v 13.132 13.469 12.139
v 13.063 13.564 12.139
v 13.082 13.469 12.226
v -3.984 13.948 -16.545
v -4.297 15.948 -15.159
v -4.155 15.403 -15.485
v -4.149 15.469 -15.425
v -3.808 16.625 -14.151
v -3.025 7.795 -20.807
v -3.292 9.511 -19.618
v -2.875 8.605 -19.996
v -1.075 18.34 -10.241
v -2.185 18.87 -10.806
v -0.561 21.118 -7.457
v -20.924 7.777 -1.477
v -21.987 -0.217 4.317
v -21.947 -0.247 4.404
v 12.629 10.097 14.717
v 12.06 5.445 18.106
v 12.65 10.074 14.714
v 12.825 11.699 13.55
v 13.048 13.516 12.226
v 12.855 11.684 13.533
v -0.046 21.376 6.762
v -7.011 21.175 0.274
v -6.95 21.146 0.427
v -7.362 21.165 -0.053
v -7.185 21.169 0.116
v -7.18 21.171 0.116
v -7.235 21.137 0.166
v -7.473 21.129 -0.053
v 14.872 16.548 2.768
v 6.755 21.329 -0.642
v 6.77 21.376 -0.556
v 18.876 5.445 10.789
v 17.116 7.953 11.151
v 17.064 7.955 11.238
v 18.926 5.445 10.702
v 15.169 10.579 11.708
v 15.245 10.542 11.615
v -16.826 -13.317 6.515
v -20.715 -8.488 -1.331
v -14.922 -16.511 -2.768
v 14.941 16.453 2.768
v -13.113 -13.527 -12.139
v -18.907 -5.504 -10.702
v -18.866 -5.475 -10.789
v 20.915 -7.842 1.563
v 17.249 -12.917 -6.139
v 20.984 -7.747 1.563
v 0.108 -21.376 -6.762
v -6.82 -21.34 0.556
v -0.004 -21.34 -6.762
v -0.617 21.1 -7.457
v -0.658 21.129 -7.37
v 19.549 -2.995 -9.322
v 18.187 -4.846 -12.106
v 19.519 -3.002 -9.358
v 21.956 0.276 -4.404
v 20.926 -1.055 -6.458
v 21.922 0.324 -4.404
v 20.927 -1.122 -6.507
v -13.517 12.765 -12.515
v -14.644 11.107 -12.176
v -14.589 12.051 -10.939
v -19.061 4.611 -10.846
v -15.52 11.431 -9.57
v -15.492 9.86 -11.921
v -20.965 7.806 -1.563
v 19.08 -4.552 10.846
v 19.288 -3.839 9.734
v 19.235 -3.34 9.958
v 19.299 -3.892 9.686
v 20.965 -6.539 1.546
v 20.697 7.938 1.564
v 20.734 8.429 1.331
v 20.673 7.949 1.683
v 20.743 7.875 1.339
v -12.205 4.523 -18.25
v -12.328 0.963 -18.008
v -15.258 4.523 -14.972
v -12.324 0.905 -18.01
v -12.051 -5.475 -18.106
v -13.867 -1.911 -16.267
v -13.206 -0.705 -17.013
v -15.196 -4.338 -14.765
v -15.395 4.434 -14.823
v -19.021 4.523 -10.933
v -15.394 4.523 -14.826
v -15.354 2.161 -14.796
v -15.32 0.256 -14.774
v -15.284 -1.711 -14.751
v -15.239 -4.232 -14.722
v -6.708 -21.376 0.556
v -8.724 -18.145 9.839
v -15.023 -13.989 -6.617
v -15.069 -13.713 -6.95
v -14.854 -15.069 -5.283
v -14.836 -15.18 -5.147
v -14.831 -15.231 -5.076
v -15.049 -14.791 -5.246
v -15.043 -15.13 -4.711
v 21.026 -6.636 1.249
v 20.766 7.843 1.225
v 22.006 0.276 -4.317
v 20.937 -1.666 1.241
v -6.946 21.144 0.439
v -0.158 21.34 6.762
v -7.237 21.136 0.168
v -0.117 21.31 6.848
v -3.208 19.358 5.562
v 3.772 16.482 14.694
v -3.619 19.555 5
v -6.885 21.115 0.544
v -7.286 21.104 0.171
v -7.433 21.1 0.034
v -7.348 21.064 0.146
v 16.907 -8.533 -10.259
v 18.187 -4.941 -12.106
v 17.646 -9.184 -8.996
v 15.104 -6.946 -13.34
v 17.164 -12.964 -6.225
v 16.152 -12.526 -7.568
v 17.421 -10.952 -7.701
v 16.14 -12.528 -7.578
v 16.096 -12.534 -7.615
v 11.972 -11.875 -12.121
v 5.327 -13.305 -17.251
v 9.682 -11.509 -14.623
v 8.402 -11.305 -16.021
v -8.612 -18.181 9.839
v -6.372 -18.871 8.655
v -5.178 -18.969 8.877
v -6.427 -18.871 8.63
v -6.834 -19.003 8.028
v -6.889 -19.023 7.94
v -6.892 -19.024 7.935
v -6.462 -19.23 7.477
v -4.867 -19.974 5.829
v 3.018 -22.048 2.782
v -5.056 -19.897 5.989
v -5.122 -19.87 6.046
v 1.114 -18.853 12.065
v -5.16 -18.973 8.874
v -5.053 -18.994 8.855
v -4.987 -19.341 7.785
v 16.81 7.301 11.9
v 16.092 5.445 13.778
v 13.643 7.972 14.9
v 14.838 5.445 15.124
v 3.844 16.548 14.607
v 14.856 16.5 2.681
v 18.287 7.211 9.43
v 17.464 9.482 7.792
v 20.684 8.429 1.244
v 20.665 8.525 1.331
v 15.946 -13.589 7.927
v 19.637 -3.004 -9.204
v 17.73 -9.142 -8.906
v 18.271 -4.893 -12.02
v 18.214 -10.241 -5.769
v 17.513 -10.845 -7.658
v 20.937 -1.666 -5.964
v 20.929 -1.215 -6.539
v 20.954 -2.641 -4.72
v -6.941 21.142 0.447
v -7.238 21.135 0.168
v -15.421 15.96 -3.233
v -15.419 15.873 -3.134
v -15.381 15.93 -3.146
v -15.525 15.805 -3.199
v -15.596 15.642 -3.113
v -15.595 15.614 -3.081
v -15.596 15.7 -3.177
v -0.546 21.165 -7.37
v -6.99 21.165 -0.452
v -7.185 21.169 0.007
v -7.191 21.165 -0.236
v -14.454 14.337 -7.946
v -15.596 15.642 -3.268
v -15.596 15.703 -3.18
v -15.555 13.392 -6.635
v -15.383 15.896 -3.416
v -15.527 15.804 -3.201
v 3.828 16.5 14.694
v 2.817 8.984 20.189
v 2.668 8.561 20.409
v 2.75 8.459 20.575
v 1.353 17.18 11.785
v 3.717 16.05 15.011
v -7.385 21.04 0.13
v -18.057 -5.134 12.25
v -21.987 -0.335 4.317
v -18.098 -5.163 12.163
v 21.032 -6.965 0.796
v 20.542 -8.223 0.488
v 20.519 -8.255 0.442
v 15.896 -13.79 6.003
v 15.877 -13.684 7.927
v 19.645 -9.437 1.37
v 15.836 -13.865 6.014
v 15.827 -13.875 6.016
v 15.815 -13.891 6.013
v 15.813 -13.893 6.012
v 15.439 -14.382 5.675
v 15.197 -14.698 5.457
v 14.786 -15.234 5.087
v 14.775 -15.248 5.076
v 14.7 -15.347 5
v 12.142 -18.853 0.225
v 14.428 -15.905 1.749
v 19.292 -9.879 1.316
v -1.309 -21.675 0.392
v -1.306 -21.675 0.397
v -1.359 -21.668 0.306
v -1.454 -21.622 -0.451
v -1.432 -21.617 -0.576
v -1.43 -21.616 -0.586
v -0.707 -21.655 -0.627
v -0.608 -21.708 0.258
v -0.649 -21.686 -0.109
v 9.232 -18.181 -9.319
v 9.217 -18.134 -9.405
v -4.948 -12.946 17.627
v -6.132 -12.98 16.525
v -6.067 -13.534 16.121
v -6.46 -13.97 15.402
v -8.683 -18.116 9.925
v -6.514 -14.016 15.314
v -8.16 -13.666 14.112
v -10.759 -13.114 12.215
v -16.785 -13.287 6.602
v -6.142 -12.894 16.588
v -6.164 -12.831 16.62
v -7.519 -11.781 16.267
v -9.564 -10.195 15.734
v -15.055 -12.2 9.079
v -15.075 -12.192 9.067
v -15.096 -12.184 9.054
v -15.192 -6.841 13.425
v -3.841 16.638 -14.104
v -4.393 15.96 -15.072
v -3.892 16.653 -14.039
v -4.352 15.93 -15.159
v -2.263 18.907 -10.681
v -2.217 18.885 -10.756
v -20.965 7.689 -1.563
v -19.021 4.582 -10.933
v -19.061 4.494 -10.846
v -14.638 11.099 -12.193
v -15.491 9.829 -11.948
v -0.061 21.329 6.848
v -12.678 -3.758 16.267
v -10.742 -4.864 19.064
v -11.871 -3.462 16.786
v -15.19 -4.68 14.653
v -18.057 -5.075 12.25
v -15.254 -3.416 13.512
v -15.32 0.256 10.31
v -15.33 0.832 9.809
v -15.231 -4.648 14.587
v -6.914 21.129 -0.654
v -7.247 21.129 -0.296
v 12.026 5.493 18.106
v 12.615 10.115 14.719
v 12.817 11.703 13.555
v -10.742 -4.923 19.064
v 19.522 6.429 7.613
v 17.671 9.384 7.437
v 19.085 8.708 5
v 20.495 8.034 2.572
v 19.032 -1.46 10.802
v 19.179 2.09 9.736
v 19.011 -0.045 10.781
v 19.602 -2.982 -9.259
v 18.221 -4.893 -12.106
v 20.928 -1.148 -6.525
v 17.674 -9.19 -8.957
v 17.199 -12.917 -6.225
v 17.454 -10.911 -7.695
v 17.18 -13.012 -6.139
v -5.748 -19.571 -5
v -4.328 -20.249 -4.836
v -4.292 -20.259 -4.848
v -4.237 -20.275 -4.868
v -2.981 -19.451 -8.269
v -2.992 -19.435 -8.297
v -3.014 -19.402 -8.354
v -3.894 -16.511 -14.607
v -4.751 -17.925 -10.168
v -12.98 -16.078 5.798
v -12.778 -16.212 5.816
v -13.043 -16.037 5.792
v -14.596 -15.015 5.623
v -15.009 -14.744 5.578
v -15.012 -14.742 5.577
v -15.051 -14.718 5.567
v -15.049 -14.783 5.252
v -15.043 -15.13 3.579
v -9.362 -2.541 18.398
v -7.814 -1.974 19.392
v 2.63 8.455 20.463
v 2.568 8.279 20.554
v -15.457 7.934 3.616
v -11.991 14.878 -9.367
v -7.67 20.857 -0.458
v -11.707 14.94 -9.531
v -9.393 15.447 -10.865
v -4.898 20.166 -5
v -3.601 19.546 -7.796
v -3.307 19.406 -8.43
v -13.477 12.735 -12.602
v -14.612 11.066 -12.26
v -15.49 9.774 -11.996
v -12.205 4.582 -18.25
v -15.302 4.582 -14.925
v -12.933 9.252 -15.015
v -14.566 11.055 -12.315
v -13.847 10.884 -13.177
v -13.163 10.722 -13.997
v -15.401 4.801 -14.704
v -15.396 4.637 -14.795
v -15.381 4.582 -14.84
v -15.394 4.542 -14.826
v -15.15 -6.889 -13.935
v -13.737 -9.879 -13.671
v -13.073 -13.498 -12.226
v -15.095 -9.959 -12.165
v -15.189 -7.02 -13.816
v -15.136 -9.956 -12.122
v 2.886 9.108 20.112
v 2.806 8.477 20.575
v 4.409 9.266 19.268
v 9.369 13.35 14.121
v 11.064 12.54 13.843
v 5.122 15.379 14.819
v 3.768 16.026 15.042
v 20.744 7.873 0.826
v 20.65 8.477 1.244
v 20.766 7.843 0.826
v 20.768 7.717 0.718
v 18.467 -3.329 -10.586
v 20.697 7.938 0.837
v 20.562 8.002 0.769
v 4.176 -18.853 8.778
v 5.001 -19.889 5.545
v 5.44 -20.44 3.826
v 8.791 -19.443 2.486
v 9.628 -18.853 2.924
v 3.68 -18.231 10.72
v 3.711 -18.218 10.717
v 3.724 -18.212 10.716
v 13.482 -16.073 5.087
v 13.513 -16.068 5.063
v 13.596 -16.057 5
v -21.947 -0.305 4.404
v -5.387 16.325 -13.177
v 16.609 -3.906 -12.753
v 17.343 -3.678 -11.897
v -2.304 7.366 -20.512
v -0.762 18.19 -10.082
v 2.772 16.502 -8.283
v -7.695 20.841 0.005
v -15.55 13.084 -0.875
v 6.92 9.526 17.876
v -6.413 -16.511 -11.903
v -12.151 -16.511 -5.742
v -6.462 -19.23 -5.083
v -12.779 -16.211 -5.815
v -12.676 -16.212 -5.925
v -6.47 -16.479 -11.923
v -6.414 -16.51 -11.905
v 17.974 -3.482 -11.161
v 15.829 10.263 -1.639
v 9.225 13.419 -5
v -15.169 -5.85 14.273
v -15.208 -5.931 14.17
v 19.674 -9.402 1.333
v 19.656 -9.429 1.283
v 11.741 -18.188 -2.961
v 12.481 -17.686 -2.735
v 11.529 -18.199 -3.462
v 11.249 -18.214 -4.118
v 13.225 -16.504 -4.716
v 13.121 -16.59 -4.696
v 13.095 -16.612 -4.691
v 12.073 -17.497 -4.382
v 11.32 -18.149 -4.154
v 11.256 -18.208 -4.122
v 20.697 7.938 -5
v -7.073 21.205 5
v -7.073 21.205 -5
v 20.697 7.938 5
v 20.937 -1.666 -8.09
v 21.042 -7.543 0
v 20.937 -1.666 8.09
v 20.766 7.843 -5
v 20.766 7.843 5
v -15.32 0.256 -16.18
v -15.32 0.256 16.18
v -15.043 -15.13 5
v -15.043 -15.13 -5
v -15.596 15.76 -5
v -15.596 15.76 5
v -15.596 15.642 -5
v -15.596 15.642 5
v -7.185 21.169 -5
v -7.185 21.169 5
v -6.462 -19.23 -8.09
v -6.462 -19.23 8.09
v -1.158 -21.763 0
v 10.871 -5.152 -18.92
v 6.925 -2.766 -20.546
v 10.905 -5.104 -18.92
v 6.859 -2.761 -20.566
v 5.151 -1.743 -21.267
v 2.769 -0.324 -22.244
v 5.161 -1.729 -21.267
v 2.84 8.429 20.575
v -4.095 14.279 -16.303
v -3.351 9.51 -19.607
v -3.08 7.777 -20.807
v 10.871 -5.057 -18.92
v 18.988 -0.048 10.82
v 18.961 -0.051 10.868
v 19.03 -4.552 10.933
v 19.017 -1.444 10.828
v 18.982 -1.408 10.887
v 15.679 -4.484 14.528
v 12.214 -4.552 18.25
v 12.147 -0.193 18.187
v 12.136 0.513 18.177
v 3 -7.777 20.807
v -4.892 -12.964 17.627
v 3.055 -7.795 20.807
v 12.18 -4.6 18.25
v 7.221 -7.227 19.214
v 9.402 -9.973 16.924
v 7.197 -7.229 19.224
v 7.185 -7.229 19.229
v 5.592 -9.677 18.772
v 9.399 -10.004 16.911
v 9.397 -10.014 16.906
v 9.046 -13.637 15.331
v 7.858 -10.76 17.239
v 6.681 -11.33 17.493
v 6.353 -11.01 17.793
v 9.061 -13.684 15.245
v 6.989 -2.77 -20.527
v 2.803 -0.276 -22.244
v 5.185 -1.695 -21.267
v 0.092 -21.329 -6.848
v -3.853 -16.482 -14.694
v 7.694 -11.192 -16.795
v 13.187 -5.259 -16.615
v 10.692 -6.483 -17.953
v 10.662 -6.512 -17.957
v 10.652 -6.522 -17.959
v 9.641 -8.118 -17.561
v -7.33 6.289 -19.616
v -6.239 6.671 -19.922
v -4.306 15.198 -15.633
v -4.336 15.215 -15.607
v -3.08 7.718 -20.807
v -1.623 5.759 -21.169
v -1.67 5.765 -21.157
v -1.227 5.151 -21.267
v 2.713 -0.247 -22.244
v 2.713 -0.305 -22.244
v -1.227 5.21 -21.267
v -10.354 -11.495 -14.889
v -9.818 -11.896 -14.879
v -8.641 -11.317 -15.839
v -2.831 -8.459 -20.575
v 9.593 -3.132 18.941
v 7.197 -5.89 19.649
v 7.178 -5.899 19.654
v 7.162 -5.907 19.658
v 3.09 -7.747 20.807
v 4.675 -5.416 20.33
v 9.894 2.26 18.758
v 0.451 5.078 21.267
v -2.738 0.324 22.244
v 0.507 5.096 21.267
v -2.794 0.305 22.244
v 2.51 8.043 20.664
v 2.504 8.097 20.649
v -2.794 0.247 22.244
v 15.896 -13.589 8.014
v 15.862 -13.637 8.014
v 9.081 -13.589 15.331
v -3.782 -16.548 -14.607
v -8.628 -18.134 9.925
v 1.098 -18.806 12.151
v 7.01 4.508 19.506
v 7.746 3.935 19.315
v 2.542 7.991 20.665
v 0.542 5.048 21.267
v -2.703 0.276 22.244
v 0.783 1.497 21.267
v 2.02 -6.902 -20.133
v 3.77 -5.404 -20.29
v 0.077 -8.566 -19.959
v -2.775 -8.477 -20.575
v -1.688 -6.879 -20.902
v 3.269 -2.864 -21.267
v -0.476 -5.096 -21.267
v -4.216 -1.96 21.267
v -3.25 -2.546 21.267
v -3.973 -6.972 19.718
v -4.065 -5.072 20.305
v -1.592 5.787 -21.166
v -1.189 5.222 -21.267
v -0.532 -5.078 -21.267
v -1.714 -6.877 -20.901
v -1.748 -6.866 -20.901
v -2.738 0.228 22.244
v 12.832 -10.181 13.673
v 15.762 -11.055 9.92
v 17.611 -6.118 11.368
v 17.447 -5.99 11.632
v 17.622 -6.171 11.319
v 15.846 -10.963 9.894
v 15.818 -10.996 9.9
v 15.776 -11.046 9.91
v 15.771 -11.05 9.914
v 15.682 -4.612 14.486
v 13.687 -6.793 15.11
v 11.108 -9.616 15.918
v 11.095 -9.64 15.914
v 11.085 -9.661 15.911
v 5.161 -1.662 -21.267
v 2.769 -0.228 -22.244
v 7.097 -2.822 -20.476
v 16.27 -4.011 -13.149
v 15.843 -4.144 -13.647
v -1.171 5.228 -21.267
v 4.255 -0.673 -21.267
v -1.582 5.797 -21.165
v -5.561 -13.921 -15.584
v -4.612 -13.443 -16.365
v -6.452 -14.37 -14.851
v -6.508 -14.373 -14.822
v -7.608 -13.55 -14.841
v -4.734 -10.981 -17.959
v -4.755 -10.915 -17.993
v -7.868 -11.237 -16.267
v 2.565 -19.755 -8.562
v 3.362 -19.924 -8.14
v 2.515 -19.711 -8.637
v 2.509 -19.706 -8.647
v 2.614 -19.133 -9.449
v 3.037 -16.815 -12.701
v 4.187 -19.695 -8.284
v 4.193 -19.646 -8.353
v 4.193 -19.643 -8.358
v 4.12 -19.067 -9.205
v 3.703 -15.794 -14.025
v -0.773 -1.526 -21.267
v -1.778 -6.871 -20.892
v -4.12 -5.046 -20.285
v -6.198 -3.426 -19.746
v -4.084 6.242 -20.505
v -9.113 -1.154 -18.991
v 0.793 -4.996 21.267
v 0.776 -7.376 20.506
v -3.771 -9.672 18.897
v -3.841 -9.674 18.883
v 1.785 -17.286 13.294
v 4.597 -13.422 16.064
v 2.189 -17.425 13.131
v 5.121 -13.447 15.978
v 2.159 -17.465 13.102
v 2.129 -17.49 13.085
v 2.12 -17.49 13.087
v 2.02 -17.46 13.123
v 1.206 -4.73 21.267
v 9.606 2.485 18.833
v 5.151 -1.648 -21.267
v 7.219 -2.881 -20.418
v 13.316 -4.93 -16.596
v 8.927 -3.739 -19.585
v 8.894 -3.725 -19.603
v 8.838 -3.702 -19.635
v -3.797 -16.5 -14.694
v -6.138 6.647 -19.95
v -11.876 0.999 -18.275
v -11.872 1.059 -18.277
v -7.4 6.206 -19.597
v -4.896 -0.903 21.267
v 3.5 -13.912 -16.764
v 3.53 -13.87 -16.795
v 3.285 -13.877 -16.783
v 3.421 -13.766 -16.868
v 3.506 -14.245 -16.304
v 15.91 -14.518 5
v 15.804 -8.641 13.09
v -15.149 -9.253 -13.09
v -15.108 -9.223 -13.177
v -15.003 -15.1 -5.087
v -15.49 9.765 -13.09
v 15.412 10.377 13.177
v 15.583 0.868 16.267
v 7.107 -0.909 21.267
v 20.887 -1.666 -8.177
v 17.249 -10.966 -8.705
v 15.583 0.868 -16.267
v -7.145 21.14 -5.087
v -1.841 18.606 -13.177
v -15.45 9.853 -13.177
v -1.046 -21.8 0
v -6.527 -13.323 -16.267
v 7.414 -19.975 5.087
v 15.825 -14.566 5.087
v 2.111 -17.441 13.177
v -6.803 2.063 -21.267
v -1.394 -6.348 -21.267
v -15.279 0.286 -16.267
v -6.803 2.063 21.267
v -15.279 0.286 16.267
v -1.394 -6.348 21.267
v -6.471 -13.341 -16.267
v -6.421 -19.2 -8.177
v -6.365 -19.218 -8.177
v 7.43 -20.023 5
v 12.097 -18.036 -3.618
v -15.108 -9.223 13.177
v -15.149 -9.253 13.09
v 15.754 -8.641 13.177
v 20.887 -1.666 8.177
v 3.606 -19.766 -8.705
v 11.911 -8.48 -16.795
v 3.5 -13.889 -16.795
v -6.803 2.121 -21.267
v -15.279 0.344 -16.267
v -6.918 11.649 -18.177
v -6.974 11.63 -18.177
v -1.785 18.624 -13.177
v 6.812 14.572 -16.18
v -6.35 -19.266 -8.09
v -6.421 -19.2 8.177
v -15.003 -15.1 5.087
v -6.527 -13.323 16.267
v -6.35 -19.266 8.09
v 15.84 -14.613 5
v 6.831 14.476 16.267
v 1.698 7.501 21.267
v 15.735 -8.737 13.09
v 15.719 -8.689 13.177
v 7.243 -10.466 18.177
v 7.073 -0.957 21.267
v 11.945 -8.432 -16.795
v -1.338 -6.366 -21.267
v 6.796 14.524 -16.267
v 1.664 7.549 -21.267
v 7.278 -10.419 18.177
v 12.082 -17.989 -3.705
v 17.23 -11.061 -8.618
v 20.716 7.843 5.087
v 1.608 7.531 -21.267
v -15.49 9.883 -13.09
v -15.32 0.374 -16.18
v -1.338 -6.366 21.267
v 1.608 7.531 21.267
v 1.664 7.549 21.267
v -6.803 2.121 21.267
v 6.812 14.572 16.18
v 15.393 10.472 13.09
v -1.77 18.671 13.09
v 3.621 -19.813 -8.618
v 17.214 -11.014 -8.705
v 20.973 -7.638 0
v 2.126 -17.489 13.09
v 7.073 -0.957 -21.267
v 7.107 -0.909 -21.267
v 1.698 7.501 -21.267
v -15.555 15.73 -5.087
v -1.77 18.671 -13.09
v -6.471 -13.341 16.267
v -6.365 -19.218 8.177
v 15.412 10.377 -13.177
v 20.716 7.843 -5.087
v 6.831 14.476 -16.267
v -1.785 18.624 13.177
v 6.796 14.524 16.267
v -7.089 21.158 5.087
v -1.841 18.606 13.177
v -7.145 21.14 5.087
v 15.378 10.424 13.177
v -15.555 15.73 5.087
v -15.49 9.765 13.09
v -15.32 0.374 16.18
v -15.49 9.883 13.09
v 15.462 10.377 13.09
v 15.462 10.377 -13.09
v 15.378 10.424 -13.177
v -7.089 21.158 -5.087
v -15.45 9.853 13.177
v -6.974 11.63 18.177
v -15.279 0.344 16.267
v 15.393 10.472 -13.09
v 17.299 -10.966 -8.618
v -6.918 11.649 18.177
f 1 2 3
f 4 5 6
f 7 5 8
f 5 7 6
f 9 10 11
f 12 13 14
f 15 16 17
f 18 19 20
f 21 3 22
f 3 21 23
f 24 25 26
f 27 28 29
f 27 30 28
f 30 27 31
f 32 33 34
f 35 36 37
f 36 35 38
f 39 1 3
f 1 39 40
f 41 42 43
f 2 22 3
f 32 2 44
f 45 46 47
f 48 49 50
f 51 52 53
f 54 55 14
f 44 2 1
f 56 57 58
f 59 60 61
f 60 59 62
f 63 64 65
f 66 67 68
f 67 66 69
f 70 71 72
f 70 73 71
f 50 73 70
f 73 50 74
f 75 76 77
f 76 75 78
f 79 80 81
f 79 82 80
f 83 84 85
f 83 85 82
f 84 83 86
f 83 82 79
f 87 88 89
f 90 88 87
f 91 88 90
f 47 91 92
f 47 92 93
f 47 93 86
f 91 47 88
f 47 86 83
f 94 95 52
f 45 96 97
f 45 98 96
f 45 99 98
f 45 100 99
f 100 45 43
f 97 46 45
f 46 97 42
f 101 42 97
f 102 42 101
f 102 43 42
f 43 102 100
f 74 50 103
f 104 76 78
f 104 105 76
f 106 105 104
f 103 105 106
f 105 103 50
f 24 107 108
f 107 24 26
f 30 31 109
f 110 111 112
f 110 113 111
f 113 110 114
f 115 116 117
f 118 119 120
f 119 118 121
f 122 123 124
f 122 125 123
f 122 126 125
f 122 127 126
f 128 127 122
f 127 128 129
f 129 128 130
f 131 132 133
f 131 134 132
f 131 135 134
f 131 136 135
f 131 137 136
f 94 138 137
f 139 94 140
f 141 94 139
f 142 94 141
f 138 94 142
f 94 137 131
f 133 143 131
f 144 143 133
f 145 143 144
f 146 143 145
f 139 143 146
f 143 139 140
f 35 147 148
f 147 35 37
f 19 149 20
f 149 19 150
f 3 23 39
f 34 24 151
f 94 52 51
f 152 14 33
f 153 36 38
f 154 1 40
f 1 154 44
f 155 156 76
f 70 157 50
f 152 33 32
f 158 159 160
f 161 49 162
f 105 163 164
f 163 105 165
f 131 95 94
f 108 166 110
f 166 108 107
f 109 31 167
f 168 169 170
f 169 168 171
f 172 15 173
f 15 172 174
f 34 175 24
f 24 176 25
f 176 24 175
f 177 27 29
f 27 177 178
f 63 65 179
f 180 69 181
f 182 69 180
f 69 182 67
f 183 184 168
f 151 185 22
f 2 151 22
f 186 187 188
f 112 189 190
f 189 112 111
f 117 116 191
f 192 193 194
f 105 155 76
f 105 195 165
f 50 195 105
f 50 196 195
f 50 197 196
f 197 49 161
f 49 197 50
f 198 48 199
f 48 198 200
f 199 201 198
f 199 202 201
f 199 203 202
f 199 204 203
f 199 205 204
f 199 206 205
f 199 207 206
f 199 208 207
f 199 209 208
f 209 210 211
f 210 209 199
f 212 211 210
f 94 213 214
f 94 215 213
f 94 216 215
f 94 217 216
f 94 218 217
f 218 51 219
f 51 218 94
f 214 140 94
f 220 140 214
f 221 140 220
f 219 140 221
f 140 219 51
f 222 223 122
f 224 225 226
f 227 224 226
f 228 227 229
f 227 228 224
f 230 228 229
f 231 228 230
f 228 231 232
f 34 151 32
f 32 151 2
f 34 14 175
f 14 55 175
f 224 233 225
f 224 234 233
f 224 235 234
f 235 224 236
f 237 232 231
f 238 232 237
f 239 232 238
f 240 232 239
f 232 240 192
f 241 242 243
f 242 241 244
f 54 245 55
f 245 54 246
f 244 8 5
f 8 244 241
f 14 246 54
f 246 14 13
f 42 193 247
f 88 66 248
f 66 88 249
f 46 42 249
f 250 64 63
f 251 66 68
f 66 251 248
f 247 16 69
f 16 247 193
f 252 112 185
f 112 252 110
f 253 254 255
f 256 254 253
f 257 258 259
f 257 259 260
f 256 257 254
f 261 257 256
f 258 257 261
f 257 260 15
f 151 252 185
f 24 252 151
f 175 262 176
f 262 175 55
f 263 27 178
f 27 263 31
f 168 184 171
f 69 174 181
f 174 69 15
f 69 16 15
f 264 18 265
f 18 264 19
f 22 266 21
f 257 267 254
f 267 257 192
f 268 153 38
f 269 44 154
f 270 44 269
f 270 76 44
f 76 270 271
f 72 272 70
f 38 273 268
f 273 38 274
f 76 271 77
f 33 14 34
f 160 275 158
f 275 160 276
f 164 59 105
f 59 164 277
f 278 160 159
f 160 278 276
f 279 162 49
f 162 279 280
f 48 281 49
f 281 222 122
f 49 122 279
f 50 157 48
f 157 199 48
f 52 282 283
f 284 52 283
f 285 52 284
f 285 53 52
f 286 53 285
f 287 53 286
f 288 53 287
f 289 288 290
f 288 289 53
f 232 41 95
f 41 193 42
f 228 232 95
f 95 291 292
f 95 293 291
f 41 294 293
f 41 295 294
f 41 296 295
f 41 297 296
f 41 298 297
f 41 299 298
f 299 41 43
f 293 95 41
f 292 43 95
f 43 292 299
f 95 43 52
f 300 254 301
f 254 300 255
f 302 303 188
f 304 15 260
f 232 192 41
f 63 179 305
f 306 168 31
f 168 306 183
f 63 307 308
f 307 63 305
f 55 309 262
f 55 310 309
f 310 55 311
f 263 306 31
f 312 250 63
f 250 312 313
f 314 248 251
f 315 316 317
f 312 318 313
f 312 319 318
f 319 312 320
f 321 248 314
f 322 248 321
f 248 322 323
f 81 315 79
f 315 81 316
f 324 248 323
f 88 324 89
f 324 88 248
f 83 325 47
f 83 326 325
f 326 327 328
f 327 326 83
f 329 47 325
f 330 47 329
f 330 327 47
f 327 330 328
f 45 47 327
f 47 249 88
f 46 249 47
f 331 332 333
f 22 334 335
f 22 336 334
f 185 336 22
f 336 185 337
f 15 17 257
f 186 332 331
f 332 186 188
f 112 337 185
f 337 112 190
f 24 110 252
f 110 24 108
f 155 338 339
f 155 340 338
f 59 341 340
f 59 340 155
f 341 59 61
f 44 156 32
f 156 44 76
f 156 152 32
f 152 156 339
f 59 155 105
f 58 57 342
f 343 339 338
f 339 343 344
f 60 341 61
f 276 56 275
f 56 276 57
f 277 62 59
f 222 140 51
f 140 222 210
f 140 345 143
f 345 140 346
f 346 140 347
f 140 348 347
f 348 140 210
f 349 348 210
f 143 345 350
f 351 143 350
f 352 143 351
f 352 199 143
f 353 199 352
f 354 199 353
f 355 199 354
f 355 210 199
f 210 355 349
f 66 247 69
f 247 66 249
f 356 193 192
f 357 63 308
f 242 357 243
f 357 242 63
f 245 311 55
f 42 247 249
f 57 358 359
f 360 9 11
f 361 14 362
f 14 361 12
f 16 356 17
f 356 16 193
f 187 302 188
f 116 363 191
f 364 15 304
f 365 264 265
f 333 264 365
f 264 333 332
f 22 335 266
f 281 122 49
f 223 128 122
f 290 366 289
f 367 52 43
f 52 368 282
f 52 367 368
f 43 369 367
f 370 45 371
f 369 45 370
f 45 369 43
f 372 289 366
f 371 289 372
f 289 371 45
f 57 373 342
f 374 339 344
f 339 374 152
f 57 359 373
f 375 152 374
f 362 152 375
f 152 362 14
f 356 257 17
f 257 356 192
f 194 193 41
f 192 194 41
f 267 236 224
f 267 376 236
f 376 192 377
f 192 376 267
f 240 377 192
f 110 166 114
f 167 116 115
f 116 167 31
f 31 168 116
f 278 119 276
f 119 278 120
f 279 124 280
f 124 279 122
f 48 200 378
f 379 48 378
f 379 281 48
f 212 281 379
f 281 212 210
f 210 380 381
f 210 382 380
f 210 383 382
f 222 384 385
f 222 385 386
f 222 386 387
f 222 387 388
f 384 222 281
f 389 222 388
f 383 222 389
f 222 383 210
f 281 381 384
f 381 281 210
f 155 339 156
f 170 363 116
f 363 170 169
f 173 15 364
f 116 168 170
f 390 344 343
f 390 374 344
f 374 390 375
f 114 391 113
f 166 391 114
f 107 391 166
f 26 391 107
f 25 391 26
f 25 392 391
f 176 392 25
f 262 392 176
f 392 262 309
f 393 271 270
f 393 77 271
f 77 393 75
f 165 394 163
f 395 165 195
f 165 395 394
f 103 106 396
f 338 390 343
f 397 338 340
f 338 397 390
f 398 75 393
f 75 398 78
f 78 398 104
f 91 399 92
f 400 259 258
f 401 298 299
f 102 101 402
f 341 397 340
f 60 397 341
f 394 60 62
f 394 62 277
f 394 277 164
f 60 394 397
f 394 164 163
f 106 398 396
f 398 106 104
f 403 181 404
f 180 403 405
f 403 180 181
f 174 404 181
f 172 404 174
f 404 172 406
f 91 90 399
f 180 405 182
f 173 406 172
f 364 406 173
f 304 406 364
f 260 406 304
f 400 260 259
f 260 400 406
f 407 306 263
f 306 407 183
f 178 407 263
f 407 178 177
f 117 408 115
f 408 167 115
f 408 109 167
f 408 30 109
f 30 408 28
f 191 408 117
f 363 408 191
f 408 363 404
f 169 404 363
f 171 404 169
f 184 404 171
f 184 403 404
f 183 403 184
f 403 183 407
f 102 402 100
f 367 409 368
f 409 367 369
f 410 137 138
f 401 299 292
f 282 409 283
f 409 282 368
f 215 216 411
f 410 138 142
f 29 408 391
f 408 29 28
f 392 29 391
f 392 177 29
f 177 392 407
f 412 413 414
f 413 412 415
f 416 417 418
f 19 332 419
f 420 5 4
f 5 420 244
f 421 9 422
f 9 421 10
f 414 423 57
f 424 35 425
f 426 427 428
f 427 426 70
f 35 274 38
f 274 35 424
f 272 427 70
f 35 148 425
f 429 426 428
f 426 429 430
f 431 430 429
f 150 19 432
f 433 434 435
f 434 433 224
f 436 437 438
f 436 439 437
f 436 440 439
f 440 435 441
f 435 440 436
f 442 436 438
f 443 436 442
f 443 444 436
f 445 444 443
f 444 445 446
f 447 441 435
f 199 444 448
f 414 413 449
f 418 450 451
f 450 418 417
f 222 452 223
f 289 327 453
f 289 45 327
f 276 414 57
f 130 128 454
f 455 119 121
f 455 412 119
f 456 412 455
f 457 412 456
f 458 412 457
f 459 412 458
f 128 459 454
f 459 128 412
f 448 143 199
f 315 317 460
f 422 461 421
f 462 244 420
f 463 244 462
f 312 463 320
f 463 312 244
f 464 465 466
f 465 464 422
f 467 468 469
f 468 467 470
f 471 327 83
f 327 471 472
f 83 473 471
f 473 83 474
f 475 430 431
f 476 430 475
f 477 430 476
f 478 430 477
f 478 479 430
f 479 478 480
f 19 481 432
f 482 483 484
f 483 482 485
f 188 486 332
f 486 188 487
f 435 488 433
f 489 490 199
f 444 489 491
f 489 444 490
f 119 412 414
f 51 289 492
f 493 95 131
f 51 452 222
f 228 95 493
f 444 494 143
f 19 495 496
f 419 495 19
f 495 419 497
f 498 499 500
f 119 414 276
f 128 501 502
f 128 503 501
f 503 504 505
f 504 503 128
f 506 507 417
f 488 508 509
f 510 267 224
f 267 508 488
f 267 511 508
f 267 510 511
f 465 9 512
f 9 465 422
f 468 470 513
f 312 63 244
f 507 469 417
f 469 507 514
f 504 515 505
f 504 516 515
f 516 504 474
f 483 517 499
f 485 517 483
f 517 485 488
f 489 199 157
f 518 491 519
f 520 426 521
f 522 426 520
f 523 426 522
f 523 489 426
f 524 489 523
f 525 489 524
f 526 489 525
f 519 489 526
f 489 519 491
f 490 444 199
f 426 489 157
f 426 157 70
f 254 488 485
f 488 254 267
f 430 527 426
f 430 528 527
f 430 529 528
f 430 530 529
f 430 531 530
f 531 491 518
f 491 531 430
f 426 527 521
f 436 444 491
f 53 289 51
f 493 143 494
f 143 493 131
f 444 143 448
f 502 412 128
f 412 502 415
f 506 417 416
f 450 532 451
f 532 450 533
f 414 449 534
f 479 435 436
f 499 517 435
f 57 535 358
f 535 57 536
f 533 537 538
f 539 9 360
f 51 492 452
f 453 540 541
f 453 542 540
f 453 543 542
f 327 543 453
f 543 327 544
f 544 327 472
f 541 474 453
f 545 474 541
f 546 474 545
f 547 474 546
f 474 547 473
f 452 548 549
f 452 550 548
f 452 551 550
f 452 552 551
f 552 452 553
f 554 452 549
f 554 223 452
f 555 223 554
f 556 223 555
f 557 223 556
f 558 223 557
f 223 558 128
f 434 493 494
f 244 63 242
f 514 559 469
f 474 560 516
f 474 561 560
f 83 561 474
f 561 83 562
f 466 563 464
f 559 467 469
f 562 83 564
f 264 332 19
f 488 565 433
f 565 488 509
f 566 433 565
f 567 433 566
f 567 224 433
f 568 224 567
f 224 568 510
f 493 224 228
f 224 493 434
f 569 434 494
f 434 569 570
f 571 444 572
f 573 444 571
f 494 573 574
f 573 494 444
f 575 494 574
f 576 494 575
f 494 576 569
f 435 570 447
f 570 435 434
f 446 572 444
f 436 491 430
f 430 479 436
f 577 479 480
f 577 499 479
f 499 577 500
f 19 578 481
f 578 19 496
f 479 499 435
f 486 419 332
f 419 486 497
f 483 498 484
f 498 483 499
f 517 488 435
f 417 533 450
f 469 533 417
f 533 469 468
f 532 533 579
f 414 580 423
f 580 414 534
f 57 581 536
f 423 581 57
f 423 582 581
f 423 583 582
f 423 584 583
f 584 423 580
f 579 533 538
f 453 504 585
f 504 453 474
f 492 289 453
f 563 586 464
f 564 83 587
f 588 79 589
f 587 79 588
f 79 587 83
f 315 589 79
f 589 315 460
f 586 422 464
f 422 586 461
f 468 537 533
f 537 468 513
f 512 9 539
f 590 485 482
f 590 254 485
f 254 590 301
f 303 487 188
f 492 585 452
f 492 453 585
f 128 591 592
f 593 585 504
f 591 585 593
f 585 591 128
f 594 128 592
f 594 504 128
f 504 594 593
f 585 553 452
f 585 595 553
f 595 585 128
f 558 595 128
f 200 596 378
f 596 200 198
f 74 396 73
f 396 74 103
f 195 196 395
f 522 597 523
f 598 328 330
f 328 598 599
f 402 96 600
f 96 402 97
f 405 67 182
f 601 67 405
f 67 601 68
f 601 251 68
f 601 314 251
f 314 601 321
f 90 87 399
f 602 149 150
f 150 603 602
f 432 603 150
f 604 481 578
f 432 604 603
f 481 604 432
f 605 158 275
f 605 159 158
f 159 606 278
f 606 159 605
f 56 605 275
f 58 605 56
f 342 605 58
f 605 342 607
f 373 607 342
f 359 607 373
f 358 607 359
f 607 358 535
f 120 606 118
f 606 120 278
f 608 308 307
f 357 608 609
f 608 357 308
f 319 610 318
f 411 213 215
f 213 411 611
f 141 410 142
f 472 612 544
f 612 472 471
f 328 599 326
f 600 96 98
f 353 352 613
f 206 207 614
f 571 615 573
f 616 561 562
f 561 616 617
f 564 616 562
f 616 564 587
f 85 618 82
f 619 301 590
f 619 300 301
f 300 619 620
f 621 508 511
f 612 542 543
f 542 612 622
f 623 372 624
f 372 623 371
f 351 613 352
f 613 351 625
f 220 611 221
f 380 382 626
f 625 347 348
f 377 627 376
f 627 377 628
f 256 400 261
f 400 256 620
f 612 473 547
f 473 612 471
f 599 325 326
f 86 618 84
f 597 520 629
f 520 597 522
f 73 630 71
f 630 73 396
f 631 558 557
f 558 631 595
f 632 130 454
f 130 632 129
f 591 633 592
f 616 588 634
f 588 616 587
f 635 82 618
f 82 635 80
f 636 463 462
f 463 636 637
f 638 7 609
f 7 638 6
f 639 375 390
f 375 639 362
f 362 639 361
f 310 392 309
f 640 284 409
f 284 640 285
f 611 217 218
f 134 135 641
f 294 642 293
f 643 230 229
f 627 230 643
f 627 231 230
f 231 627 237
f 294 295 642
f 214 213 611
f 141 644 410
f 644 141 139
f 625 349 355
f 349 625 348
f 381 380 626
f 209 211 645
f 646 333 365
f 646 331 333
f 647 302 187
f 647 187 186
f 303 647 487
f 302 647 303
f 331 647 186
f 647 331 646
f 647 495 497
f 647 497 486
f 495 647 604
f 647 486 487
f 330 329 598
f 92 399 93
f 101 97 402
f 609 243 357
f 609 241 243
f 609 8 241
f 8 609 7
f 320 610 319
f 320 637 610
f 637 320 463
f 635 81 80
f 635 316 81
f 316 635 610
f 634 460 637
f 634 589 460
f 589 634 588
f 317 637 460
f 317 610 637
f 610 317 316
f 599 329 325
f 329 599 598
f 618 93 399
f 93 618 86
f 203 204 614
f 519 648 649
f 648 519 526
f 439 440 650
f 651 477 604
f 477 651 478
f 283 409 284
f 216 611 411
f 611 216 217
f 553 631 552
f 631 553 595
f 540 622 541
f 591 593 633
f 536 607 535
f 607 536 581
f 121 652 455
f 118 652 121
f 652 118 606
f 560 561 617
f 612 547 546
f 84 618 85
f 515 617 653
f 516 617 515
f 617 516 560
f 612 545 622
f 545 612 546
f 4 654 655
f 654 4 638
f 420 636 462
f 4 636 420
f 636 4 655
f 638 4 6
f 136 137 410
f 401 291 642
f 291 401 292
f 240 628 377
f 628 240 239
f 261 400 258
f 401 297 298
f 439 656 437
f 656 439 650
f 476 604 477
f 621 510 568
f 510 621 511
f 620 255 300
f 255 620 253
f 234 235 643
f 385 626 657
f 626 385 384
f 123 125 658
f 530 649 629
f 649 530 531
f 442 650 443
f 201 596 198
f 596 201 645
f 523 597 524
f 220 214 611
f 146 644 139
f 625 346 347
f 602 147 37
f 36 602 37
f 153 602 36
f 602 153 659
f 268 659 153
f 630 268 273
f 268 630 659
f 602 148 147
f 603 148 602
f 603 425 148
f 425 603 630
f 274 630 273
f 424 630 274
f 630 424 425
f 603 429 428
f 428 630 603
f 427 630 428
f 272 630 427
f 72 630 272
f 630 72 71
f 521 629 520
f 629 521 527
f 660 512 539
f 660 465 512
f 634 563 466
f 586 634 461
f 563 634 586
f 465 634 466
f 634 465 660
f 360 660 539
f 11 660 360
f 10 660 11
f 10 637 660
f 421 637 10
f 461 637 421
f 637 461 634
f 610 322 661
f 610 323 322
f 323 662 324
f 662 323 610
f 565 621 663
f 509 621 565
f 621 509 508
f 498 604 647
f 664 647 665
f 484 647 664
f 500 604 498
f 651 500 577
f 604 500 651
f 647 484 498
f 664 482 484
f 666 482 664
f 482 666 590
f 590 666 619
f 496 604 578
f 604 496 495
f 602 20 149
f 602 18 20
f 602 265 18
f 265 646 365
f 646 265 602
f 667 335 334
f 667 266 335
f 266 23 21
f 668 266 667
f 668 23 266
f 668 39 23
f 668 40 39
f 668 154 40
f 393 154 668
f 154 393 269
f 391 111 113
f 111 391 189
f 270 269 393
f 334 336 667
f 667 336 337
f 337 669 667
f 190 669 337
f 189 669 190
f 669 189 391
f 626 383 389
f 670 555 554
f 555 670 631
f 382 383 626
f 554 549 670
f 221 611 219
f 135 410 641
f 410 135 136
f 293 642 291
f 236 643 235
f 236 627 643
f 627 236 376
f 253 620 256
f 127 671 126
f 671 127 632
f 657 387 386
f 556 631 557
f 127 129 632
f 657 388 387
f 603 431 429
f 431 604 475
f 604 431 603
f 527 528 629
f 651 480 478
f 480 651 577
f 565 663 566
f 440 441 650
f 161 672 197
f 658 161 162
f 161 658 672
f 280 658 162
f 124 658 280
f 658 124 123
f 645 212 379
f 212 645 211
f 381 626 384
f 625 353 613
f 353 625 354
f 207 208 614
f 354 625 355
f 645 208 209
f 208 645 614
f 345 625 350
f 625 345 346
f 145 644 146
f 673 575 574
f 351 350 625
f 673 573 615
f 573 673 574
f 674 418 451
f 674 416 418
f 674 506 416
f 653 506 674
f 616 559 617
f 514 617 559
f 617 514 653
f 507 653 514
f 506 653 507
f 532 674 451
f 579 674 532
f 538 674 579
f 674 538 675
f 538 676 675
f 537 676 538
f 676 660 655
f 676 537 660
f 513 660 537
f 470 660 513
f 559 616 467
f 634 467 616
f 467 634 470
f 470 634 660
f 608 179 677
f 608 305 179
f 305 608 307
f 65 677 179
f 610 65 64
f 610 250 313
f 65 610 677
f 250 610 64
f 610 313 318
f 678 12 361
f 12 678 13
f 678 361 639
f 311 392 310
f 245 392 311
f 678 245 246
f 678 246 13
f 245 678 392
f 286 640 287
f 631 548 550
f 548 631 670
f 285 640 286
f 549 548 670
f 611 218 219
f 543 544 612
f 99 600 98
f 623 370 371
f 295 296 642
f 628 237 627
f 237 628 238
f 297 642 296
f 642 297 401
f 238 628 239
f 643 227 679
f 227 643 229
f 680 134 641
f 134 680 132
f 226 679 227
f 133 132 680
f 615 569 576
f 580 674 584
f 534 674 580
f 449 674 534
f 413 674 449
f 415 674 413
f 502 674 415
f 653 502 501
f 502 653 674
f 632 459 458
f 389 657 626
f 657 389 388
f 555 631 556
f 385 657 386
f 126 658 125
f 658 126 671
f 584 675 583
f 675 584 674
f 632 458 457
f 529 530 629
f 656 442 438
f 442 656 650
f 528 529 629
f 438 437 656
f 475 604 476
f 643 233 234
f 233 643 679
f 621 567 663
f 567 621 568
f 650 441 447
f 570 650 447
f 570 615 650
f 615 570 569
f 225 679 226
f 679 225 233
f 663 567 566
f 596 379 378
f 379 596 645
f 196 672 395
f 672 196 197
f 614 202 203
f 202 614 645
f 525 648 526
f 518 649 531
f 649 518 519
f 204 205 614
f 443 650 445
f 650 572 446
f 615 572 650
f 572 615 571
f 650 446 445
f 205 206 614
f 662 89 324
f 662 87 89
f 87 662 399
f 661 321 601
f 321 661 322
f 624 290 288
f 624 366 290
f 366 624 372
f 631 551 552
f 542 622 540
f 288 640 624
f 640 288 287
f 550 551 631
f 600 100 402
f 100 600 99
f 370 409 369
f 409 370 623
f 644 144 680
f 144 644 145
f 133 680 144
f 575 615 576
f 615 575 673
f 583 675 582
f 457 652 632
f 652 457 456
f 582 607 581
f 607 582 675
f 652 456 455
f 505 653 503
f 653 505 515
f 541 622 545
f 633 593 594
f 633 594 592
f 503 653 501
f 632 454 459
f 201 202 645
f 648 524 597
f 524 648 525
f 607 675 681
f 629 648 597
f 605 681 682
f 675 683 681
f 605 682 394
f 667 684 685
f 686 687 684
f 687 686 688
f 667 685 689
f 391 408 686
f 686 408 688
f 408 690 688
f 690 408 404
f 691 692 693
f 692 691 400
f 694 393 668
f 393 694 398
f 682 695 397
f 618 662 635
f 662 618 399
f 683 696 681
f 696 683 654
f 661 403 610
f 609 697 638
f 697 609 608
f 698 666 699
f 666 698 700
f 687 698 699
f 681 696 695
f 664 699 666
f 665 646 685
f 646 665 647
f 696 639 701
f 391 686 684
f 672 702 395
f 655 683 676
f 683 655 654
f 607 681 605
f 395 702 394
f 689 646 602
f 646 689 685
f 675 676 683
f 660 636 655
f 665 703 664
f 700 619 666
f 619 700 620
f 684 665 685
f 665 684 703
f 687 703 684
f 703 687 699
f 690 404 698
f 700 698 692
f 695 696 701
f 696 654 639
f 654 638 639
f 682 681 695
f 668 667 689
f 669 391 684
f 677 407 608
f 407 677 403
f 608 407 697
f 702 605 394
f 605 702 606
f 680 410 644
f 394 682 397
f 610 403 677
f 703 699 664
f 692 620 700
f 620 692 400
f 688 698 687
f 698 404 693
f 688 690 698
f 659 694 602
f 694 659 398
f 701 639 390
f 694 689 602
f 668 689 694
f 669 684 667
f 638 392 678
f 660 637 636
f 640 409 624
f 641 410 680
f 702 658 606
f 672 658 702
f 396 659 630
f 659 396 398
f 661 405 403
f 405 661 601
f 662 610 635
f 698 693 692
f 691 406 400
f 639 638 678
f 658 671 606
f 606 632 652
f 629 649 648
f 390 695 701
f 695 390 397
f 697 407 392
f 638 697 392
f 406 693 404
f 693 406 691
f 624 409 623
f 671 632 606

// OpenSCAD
// Auto-generated OpenSCAD file

    inner_points = 10*[[0.7057265485457351, -0.09094884907028836, -2.1180339887490542], [0.7057265485407271, -0.09094884906961656, 2.1180339887507356], [0.16480805396553816, 0.7501261667404855, -2.118033988749827], [0.16480805396053017, 0.7501261667411573, 2.118033988749963], [-0.13534846726503874, -0.6318673436504852, -2.118033988749963], [-0.13534846727004674, -0.6318673436498135, 2.118033988749827], [-0.6762669618452357, 0.20920767216028854, -2.1180339887507356], [-0.6762669618502437, 0.20920767216096034, 2.1180339887490542], [2.0666145112140093, 0.7842756603041526, -0.49999999999768924], [2.066614511212827, 0.7842756603043113, 0.5000000000023108], [-1.496236429937139, -1.5070918530244133, -0.5000000000015379], [-1.496236429938321, -1.5070918530242545, 0.4999999999984621], [1.189538758212475, -0.8432292128820578, -1.670820393248405], [1.5809510579168244, -1.4518368117400606, 0.5000000000020912], [-0.7104164554105592, 2.1110141294109295, -0.5000000000011826], [-0.7104164554117414, 2.111014129411088, 0.4999999999988174], [0.3484637424017012, -1.3841477074622546, -1.6708203932493135], [0.7398760421060506, -1.9927553063202574, 0.5000000000011826], [-1.551491471221333, 1.5700956348307327, -0.5000000000020912], [-1.5514914712225152, 1.570095634830891, 0.4999999999979088], [1.2066135049926328, -1.794132441507042, -0.36180339887328655], [0.7228012953227978, -1.0418520776948579, 1.809016994375959], [-0.6933417086273064, 1.16011090078553, -1.809016994375959], [-0.6933417086315835, 1.1601109007861032, 1.8090169943739358], [1.5362487904951605, 1.0376601608124174, -1.3090169943733039], [1.5362487904920659, 1.0376601608128326, 1.309016994376591], [-1.5067892037965744, -0.9194013377221607, -1.309016994376591], [-1.506789203799669, -0.9194013377217455, 1.3090169943733039], [2.0942420318555155, -0.7543180836233406, 2.587389943224604e-12], [-0.10772094662544573, -2.170461087577722, 2.0876308632757284e-13], [1.5533235372772314, 0.08675693218717659, -1.6180339887480804], [1.5533235372734056, 0.08675693218768951, 1.6180339887517095], [0.678099027903047, 1.447644894857364, -1.618033988749331], [0.6780990278992212, 1.4476448948578768, 1.618033988750459], [-0.6486394412037297, -1.3293860717672048, -1.618033988750459], [-0.6486394412075556, -1.3293860717666919, 1.618033988749331], [-1.5238639505779141, 0.031501890902982464, -1.6180339887517095], [-1.52386395058174, 0.03150189090349539, 1.6180339887480804], [2.08368925799608, -0.1666275683210884, -0.8090169943724658], [2.083689257994167, -0.16662756832083173, 0.8090169943774291], [-0.6380866673442945, -1.9170765870694573, -0.8090169943754059], [-0.6380866673462073, -1.9170765870692006, 0.809016994374489], [1.719904478931324, -1.0966137133903227, -0.8618033988727903], [1.5703982840554762, -0.8641462964375515, 1.309016994376933], [-0.1800507346897975, 1.857629628902408, -1.309016994375463], [-0.18005073469289257, 1.8576296289028231, 1.3090169943744319], [0.3590165162611366, -1.9718382227645073, -0.8618033988742605], [0.2095103213852889, -1.7393708058117359, 1.309016994375463], [-1.5409386973599848, 0.9824051195282235, -1.309016994376933], [-1.5409386973630799, 0.9824051195286387, 1.309016994372962]];

    outer_points = 10*[[1.2164351229694326, -0.4552393565390054, 1.81634542347101], [-1.8825899471092338, -0.5445384218729208, -1.070234075166359], [1.2010095010844373, 0.5445384218729208, 1.80197726481464], [-1.898015568994229, 0.4552393565390054, -1.0846022338227295], [1.898015568994229, -0.4552393565390054, 1.0846022338227295], [-1.2010095010844373, -0.5445384218729208, -1.80197726481464], [1.8825899471092338, 0.5445384218729208, 1.070234075166359], [-1.2164351229694326, 0.4552393565390054, -1.81634542347101], [-1.0701074495480267, -0.4893485643329636, 1.8977555181073444], [-1.8016880300626414, -0.5104292140789626, 1.2163265339716638], [1.817113651947637, -0.4893485643329636, -1.2019583753152931], [1.0855330714330222, -0.5104292140789626, -1.8833873594509738], [0.9030594368115687, -1.3588953396765044, 1.5244523891846673], [-0.6739085218196809, -2.12810364074632, 0.05558935114624375], [-0.007671924205115532, 2.12810364074632, 0.6761538385020369], [-0.7392525047197304, 2.107022991000321, -0.005275145633643785], [1.5846398828363653, -1.3588953396765044, 0.7927091995363865], [0.007671924205115532, -2.12810364074632, -0.6761538385020369], [0.6739085218196809, 2.12810364074632, -0.05558935114624375], [-0.05767205869493397, 2.107022991000321, -0.7370183352819244], [0.2986778374294102, -2.1953274817801613, 0.27820275819814366], [-1.3032493017093665, -1.34686135618262, -1.2139084489020384], [1.3032493017093665, 1.34686135618262, 1.2139084489020384], [-1.343634104101889, 1.2705908488966635, -1.2515247766201674], [-0.275339197244193, 0.02759492876997861, 2.2157379862851325], [-2.1906420225408336, -0.02759492876997861, 0.4317337448986074], [2.1906420225408336, 0.02759492876997861, -0.4317337448986074], [0.275339197244193, -0.02759492876997861, -2.2157379862851325], [-0.8642951747413561, -1.808614991745605, 0.9838565139549793], [0.920105599018874, -1.808614991745605, -0.9318720275804797], [0.3040014481556744, -0.7747280055397205, 2.072063612549453], [-2.0634430414083775, -0.842946421127637, -0.1330869019522355], [0.2790422676481473, 0.842946421127637, 2.0488154434876944], [-2.0884022219159046, 0.7747280055397205, -0.15633507101399402], [2.0884022219159046, -0.7747280055397205, 0.15633507101399402], [-0.2790422676481473, -0.842946421127637, -2.0488154434876944], [2.0634430414083775, 0.842946421127637, 0.1330869019522355], [-0.3040014481556744, 0.7747280055397205, -2.072063612549453], [-0.49076680414815965, -1.2916714986426625, 1.754081144371665], [-1.6744890489301856, -1.325780706436621, 0.6515058871208207], [1.714873851322708, -1.2916714986426625, -0.6138895594026917], [0.5311516065406822, -1.325780706436621, -1.7164648166535361], [0.1082911845077349, -1.8758388327794464, 1.2064699210068792], [-1.4841023960085102, -1.645269355437336, -0.27676127568791475], [0.3812820682730764, 1.645269355437336, 1.460746627575093], [-1.5340207570235642, 1.590079497897379, -0.3232576138114317], [1.2111115122431686, -1.8758388327794464, 0.02248456911970087], [-0.3812820682730764, -1.645269355437336, -1.460746627575093], [1.4841023960085102, 1.645269355437336, 0.27676127568791475], [-0.4312004292881303, 1.590079497897379, -1.5072429656986102]];

    // Convex hull for inner set (I)
    module inner_hull() {
        hull() {
            for (p = inner_points) {
                translate(p) sphere(r=0.1);
            }
        }
    }

    // Convex hull for outer set (O) minus inner hull (O \ I)
    module outer_minus_inner() {
        difference() {
            hull() {
                for (p = outer_points) {
                    translate(p) sphere(r=0.1);
                }
            }
            inner_hull(); // Subtract inner hull
        }
    }

    // Convex hull for outer set (O) minus all translated inner hulls
    module outer_minus_AllTranslationInner() {
        difference() {
            hull() {
                for (p = outer_points) {
                    translate(p) sphere(r=0.1);
                }
            }
            hull() {
                translate([0,0,50]) inner_hull();
                translate([0,0,-50]) inner_hull();
            }; // Subtract translated inner hulls
        }
    }

    // Difference between outer_minus_inner and outer_minus_AllTranslationInner
    module outer_minus_inner_diff() {
        difference() {
            // Outer minus inner
            difference() {
                hull() {
                    for (p = outer_points) {
                        translate(p) sphere(r=0.1);
                    }
                }
                inner_hull();
            }

            // Subtract Outer minus AllTranslationInner
            difference() {
                hull() {
                    for (p = outer_points) {
                        translate(p) sphere(r=0.1);
                    }
                }
                hull() {
                    translate([0,0,50]) inner_hull();
                    translate([0,0,-50]) inner_hull();
                };
            }
        }
    }

    // Rendering all with colors applied
    color([1, 0, 0, 0.5]) inner_hull(); // Transparent red
    color([0, 1, 0, 1]) outer_minus_AllTranslationInner(); // Opaque green
    color([1, 1, 0, 1]) outer_minus_inner_diff(); // Opaque yellow
    
